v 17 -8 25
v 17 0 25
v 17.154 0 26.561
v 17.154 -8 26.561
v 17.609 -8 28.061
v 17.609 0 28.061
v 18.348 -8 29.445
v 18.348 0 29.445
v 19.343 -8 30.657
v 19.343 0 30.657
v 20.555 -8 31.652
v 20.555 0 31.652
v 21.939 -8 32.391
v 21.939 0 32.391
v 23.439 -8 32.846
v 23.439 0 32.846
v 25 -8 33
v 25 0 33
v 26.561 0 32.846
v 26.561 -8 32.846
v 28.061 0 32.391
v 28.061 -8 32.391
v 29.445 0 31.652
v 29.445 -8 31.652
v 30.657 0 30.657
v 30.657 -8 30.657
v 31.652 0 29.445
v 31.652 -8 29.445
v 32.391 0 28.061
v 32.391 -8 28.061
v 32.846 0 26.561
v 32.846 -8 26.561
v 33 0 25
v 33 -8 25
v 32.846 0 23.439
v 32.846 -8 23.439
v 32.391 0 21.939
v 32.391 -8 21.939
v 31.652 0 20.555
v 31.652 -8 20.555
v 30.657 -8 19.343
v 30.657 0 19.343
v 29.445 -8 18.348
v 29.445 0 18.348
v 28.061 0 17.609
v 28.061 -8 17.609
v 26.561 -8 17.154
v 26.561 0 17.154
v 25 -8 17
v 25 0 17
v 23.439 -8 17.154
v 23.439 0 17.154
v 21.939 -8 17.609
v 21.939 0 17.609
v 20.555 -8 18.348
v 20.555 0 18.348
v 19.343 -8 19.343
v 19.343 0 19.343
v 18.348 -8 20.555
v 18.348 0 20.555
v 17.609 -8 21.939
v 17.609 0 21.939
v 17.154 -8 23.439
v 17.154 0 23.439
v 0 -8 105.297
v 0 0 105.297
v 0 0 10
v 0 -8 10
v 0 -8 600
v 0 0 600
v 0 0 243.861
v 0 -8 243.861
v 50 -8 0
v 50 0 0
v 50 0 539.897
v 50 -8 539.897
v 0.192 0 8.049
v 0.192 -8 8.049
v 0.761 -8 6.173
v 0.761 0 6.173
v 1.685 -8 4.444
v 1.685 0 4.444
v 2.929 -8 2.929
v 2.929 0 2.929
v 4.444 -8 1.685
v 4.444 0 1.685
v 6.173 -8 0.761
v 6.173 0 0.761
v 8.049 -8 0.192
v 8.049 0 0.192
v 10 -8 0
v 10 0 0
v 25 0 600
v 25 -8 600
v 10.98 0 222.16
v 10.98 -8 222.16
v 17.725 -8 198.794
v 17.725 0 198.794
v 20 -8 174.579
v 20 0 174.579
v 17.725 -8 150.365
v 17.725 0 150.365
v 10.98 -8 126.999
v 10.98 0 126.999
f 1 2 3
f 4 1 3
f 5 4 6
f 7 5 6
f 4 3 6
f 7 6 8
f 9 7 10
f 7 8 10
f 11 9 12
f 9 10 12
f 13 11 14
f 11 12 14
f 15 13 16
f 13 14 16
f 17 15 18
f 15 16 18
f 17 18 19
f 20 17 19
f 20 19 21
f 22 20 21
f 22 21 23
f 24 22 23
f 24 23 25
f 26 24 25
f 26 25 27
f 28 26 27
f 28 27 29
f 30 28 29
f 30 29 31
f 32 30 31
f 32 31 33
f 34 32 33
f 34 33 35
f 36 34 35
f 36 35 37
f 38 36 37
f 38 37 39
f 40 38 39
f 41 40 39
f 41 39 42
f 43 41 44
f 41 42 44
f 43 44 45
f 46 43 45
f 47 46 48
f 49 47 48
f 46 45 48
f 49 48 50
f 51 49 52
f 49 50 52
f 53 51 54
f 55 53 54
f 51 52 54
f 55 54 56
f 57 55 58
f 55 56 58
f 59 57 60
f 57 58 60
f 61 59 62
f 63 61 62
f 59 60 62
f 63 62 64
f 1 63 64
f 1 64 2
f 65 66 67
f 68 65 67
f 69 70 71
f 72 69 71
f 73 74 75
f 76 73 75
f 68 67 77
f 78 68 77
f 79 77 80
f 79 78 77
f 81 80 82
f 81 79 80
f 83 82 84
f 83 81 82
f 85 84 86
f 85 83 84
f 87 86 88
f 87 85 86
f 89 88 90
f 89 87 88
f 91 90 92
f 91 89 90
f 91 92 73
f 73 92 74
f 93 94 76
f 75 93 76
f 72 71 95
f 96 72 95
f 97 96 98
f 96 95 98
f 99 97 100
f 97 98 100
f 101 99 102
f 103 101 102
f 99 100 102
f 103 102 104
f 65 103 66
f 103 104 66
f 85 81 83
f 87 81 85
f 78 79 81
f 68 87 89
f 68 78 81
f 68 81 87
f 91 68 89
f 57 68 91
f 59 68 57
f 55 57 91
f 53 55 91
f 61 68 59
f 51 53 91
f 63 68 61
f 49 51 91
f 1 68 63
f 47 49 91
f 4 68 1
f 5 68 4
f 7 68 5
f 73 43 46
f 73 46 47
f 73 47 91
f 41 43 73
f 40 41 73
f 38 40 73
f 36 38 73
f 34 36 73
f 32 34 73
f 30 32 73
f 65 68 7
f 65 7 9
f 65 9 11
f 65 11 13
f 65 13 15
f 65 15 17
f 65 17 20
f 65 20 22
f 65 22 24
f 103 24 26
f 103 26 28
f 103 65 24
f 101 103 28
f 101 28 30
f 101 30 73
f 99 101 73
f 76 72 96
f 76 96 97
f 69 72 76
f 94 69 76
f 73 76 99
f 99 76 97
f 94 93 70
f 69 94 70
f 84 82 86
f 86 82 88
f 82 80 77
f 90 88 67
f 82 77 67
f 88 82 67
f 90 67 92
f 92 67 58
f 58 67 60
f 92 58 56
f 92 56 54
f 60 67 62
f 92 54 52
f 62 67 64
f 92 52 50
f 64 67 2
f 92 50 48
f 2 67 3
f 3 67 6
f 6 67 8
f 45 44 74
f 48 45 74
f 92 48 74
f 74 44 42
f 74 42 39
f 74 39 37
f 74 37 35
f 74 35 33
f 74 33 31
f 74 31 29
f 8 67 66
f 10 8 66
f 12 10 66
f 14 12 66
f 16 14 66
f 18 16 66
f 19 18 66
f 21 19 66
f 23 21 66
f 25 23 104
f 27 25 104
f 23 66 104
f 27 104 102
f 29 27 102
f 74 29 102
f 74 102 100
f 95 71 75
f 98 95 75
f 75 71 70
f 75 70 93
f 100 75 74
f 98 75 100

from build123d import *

# Parameters (mm, degrees)
F1_DEPTH = 8
F3_D     = 16
F4_R     = 10
F6_DEPTH = 25


with BuildPart() as f1:
    # F0 (on Front) → F1 (new body)
    with BuildSketch(Plane.XZ):
        with BuildLine():
            Line((0, 105.297409), (0, 0))
            Line((0, 0), (50, 0))
            Line((50, 0), (50, 600))
            Line((50, 600), (0, 600))
            Line((0, 600), (0, 243.861474))
            ThreePointArc((0, 243.861474), (20, 174.579442), (0, 105.297409))
        make_face()
    extrude(amount=F1_DEPTH)

    # F3 (through all)
    with Locations(Plane.XZ.offset(8)):
        with Locations((25, 25)):
            Hole(F3_D / 2)

    # F4
    f4_edges = [f1.edges().sort_by_distance(p)[0] for p in [
        (0, -4, 0),
    ]]
    fillet(f4_edges, radius=F4_R)

    # F5 (on face) → F6 (cut)
    with BuildSketch(Plane.XZ.offset(8)):
        Polygon((50, 600), (25, 600), (50, 539.896909), align=None)
    extrude(amount=-F6_DEPTH, mode=Mode.SUBTRACT)


solid = f1.part
